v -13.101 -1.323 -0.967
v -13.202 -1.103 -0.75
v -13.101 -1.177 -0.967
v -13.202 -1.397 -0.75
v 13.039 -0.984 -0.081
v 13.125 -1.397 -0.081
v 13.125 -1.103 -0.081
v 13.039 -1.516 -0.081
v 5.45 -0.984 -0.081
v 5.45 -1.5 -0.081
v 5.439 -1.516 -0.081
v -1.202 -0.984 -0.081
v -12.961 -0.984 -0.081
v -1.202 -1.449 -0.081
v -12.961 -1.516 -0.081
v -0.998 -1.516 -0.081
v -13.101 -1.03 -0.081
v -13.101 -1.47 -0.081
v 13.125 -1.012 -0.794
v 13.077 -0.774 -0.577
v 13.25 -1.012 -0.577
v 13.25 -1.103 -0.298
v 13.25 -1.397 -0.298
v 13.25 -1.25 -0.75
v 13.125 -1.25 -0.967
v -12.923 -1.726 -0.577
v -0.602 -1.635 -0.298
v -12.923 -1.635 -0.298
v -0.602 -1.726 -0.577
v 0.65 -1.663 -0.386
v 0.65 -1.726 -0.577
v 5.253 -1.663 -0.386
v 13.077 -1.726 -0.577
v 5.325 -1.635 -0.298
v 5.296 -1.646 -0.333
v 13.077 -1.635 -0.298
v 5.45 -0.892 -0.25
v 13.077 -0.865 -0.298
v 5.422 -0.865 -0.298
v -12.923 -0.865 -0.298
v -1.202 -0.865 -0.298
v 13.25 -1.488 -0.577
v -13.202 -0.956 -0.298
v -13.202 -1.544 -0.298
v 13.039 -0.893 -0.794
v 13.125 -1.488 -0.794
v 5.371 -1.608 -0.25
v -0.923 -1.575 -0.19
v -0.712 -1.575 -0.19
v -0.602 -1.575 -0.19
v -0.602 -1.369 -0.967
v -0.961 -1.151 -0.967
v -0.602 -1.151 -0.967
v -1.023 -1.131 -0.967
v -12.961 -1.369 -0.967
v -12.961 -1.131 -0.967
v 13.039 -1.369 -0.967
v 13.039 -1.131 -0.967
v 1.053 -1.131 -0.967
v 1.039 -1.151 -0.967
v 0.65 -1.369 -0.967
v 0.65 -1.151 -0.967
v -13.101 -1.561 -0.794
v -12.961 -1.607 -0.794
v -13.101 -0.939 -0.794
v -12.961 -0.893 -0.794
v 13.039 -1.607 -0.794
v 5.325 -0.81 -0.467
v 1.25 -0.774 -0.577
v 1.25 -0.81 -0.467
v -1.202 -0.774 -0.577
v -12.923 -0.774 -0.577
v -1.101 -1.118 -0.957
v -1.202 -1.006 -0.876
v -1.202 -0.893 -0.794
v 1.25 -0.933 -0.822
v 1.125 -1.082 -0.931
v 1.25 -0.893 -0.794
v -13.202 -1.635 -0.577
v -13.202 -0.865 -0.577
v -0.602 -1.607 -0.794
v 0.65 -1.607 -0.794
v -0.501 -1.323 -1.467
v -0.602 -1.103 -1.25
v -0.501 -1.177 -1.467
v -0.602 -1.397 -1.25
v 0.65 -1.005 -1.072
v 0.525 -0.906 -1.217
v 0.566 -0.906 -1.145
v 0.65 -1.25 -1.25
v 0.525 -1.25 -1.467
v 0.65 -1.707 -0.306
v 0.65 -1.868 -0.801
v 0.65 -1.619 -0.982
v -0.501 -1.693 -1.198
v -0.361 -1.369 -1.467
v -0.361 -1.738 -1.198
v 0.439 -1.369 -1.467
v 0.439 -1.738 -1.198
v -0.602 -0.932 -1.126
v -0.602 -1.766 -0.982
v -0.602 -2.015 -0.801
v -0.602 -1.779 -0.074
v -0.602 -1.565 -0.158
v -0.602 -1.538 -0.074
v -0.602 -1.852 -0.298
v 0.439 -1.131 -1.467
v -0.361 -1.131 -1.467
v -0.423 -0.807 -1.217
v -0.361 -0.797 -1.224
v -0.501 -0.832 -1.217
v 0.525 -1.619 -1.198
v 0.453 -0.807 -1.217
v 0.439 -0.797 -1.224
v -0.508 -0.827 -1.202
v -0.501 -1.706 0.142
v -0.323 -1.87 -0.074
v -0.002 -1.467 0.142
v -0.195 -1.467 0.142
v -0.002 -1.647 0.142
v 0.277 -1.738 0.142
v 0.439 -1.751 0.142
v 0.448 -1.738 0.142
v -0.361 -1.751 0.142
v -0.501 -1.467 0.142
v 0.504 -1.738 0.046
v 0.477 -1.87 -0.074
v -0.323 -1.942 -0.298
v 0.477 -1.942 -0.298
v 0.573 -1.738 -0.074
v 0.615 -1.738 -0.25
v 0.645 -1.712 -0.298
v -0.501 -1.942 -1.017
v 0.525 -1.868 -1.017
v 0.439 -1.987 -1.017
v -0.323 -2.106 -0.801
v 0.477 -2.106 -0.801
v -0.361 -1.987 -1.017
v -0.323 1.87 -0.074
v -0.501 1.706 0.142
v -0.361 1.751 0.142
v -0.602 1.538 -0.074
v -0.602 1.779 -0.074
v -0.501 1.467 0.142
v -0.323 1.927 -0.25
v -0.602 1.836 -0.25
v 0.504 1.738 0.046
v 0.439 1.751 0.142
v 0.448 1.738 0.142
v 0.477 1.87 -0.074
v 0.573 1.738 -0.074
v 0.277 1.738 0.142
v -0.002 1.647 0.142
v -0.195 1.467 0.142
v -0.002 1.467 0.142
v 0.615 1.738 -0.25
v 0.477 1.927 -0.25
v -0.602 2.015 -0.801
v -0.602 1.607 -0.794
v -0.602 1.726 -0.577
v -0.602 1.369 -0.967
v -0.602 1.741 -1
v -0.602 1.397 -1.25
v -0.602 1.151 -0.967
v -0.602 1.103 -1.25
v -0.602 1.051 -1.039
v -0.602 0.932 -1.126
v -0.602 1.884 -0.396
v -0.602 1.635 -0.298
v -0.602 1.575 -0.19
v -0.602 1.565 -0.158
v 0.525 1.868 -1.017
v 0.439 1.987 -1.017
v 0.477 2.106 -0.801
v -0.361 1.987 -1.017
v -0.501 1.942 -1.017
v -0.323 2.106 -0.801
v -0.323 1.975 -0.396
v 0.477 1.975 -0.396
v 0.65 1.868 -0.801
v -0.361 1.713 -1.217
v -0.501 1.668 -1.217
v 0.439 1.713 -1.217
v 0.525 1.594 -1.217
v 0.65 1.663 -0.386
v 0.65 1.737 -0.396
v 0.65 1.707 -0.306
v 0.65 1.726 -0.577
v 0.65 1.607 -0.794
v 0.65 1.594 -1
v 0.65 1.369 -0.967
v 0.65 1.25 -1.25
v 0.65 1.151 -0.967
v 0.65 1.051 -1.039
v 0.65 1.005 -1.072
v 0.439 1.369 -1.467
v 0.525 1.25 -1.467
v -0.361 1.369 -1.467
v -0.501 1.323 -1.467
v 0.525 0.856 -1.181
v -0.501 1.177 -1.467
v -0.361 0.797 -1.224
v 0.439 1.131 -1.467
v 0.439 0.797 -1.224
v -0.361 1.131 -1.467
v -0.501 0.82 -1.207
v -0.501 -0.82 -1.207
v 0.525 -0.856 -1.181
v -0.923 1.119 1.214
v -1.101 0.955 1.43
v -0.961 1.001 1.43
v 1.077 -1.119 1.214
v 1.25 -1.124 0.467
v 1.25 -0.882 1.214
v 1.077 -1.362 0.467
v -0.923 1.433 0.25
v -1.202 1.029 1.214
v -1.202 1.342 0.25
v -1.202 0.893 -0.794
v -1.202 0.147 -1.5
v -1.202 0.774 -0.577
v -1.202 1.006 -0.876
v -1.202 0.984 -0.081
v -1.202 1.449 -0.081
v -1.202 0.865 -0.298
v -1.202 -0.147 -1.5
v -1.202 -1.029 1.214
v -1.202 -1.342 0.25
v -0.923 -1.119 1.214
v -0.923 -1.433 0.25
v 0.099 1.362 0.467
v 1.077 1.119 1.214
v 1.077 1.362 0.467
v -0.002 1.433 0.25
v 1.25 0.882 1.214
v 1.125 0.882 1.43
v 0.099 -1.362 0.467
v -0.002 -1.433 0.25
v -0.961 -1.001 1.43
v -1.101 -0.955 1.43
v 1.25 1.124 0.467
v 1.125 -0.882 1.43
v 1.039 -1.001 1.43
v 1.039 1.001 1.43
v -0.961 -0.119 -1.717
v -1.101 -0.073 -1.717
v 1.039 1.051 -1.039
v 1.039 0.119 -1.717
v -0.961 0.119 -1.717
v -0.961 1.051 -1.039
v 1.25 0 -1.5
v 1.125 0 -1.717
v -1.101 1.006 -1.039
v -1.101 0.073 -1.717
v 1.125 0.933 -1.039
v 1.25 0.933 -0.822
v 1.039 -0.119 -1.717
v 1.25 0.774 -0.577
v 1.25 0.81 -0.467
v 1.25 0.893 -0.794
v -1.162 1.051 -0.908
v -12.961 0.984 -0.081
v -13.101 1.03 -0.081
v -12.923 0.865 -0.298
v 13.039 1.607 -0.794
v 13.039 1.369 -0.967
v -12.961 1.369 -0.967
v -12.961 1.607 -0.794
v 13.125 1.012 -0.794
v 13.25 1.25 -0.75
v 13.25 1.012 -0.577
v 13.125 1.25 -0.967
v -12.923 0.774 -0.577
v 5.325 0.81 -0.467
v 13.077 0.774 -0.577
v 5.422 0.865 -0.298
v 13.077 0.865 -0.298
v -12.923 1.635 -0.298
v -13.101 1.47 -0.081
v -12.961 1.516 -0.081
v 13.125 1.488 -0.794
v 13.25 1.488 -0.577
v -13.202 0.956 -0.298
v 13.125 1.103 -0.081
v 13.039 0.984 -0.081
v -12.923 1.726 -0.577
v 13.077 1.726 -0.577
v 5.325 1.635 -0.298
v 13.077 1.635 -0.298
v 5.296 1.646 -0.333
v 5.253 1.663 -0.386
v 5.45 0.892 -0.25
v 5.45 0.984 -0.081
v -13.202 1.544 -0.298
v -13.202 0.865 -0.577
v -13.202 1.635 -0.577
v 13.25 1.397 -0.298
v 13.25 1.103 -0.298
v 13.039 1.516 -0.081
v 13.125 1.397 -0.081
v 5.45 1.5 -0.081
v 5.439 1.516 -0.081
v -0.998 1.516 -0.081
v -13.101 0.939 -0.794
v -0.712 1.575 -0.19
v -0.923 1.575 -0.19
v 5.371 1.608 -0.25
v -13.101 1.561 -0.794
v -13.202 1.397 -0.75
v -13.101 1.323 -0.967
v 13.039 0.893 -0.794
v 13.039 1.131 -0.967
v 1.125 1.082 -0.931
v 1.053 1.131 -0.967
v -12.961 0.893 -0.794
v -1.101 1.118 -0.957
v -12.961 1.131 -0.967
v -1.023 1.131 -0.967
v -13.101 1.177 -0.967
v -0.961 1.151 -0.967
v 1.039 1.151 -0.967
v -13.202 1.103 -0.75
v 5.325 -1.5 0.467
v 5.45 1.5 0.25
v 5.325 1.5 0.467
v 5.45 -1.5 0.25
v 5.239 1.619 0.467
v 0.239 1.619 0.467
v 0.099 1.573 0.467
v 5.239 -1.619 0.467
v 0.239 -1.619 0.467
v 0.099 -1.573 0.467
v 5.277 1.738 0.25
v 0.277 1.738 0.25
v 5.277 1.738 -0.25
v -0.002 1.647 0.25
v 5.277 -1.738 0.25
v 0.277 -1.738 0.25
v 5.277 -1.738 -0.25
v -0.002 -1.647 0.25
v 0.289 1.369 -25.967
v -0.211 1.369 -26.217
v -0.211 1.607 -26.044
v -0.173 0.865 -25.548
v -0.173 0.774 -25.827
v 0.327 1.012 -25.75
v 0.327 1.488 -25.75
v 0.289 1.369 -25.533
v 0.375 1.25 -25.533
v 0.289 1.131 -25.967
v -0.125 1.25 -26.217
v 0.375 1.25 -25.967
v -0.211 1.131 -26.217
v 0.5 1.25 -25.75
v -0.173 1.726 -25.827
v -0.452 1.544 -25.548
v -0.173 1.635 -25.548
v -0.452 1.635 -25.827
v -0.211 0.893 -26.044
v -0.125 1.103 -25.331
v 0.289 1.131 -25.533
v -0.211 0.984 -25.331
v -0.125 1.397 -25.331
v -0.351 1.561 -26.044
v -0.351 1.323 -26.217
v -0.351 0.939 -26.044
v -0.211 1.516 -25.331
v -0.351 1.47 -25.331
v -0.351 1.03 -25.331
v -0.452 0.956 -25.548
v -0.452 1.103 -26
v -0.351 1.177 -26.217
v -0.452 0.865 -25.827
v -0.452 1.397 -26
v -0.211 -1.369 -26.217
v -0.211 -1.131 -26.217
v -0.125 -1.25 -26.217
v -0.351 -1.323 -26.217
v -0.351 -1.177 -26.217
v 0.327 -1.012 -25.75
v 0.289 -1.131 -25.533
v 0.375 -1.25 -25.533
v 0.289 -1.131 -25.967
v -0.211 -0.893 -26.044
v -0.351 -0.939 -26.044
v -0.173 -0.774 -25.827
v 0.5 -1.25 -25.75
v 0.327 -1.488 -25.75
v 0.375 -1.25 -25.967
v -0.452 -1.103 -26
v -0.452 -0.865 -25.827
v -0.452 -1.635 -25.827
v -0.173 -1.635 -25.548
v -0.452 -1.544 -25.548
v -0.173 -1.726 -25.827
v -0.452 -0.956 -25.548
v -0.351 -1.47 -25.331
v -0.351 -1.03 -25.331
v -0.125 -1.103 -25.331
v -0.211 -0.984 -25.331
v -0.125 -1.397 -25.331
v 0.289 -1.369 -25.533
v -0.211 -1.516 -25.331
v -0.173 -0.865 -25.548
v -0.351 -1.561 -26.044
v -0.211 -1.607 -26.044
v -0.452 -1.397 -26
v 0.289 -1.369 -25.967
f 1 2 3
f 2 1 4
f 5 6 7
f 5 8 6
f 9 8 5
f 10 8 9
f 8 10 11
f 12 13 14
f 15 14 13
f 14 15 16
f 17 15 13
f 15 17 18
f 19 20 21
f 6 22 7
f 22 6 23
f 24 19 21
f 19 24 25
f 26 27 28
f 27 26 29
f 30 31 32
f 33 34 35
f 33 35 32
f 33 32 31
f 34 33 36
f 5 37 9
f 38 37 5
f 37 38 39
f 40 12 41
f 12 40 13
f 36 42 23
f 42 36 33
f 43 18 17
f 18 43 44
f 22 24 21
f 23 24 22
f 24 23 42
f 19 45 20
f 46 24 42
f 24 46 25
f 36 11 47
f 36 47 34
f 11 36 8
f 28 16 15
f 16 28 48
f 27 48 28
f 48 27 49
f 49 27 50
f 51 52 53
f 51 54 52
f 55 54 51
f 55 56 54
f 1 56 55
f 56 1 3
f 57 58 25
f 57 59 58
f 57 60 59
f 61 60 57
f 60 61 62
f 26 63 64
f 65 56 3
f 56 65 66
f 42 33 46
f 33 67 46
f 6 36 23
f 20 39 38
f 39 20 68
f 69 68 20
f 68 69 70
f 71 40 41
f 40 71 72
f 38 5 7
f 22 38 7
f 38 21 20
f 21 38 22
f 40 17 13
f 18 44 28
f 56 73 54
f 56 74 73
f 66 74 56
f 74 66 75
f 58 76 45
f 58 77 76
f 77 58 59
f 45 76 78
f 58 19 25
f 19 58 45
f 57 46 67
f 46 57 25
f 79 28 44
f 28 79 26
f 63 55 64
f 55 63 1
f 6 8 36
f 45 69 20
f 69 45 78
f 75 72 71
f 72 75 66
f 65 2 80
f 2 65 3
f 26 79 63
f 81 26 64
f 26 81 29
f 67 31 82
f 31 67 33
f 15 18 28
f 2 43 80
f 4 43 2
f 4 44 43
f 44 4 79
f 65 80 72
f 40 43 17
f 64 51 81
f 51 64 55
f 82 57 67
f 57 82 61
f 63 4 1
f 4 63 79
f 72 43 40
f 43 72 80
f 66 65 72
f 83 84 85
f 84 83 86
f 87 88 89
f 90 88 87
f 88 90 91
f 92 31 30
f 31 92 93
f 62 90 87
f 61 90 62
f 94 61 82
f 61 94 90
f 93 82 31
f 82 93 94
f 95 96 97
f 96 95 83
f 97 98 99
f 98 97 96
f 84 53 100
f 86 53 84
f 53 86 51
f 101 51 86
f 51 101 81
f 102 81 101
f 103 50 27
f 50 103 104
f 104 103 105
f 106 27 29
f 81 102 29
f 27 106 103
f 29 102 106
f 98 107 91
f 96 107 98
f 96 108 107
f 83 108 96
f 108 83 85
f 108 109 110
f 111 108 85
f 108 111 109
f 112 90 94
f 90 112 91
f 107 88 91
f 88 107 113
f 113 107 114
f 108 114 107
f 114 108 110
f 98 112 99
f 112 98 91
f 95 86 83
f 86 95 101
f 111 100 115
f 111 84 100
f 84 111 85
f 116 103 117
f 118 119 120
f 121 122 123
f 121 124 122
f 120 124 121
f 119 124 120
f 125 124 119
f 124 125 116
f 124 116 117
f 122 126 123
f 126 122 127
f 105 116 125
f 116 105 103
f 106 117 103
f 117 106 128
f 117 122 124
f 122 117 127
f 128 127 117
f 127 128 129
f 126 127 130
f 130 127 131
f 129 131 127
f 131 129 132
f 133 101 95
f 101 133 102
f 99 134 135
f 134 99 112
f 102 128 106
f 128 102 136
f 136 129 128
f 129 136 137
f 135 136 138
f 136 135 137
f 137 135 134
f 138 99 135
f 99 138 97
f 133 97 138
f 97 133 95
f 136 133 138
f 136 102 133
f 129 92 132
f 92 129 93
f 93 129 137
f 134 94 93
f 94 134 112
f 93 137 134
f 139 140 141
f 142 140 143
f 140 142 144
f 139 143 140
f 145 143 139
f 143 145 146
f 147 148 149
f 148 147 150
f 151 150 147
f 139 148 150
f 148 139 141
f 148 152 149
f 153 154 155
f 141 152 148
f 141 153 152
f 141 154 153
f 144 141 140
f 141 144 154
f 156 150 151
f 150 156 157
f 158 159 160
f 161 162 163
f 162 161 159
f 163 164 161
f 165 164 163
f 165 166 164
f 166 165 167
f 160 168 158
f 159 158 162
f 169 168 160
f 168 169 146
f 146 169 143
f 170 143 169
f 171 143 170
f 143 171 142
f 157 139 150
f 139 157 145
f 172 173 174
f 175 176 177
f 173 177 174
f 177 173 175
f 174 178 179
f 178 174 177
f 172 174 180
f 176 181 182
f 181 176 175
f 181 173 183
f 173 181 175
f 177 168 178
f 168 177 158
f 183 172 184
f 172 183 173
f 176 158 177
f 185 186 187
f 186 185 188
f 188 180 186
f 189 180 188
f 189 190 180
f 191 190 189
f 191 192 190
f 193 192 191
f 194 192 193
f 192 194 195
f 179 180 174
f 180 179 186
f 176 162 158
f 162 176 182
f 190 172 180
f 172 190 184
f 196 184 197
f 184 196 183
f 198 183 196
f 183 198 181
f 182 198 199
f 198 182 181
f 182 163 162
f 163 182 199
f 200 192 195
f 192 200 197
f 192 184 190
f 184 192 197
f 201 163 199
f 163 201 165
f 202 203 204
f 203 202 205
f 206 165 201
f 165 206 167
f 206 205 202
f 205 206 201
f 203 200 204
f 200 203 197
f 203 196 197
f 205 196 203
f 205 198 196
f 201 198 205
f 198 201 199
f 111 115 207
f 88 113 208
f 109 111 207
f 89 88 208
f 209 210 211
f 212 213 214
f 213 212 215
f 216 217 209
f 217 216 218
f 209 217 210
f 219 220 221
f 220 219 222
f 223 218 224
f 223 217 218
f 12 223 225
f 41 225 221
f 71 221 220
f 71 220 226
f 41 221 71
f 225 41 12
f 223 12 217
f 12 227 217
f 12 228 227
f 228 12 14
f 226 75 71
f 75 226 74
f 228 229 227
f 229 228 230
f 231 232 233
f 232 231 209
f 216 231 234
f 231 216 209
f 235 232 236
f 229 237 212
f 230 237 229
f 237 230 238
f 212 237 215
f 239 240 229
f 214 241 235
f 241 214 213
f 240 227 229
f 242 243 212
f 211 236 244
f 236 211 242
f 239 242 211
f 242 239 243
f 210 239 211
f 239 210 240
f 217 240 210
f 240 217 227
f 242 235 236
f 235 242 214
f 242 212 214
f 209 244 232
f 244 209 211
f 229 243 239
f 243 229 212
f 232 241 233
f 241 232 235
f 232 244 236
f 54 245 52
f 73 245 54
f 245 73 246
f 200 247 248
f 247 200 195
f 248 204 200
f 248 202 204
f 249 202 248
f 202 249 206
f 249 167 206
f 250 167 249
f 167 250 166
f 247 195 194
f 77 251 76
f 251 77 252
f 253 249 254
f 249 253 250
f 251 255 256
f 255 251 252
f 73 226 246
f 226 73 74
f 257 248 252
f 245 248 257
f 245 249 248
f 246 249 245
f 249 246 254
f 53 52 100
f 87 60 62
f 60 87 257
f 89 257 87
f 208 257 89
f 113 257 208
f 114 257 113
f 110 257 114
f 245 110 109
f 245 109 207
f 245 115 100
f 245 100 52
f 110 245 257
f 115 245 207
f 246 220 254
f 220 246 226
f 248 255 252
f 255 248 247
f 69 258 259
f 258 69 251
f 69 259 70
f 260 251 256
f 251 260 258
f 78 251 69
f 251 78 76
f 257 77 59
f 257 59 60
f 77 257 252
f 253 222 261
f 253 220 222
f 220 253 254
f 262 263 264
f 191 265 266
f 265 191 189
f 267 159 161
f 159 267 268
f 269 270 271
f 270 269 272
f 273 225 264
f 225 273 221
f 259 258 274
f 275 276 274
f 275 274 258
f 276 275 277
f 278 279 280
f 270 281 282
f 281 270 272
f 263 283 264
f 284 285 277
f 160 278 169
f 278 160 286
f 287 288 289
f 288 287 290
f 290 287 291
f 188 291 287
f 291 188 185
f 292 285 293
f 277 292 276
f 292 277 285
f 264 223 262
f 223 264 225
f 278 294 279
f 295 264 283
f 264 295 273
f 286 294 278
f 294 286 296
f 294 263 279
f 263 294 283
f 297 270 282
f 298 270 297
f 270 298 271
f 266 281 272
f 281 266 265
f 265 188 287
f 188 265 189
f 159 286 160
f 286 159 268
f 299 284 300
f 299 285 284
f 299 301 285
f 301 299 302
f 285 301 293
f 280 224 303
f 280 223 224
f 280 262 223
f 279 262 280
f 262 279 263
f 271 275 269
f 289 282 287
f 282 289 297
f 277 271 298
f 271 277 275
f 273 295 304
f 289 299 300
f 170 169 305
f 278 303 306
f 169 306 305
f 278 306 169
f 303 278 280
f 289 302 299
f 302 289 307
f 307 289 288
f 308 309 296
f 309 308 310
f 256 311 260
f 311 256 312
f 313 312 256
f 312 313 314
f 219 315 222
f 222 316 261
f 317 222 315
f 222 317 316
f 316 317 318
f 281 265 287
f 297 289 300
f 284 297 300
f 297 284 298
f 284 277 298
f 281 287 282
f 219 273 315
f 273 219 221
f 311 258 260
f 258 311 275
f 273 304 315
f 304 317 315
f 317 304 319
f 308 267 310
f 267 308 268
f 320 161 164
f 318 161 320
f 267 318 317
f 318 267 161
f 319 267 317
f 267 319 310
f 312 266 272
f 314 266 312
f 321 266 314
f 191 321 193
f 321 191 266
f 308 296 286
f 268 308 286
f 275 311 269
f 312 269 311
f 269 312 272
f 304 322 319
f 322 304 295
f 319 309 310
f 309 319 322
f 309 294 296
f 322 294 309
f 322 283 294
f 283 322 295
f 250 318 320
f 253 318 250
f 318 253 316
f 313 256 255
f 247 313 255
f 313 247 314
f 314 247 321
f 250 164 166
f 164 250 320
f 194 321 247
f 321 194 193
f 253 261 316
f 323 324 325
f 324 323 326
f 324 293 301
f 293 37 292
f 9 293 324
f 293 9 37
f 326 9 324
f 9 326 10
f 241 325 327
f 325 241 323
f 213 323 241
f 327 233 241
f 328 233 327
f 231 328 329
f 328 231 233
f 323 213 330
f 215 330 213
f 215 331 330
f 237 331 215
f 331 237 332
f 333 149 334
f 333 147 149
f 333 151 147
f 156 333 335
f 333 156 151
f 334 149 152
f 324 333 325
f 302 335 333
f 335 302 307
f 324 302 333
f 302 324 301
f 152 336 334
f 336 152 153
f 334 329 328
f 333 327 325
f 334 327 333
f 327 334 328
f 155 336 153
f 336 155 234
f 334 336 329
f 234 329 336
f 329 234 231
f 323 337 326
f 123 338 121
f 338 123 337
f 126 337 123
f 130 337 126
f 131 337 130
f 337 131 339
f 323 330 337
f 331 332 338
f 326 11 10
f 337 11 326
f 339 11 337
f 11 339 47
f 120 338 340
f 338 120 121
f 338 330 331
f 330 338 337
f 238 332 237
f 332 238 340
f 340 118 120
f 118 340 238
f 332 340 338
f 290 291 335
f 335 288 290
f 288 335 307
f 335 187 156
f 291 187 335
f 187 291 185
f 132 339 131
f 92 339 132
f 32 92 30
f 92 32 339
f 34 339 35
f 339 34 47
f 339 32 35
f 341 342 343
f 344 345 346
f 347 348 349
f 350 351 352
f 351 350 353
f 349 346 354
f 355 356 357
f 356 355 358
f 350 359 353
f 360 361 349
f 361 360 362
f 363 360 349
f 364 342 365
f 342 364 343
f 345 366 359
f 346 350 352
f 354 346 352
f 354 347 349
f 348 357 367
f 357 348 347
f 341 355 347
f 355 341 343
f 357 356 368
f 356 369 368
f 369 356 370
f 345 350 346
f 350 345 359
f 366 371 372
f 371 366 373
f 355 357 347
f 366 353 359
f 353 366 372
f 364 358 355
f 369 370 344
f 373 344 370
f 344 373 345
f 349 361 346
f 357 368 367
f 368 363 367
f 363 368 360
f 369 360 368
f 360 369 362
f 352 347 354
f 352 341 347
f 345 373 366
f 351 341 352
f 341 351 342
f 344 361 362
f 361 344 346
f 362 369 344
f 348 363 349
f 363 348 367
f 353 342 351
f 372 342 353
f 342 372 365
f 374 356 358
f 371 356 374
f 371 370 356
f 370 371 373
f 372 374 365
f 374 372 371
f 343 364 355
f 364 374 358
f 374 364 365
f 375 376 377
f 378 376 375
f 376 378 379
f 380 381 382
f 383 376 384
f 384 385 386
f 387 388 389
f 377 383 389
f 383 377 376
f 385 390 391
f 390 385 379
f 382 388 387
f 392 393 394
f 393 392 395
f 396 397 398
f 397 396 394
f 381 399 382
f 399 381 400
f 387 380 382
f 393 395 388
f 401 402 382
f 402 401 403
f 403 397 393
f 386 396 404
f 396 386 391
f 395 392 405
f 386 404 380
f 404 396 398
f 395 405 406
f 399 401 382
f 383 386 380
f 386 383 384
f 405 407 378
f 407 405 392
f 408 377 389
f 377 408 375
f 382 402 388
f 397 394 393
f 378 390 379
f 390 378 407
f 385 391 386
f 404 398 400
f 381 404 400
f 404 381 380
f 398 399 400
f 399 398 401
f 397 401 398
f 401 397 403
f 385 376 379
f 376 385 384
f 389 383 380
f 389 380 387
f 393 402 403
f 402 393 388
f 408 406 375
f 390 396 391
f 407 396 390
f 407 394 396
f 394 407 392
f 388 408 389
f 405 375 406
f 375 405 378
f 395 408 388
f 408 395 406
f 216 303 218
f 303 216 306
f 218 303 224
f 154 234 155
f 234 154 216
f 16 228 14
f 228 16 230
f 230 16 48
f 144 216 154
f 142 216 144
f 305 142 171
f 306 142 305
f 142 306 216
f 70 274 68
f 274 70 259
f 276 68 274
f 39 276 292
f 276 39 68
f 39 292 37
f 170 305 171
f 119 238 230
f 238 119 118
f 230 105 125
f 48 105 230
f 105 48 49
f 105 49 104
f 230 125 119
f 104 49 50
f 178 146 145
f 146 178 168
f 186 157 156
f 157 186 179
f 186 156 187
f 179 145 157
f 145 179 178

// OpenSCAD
// Parameters
body_d = 3.0; //[1.5:6.0:0.1]
body_t = 2.0; //[1.0:4.0:0.1]
lead_d = 0.5; //[0.25:1.0:0.05]
lead_len = 25.0; //[12.0:50.0:1]
lead_pitch = 2.5; //[1.25:5.0:0.1]
lead_embed = 1.0; //[0.5:2.0:0.1]
lead_bend_len = 5.0; //[2.0:10.0:0.5]
transition_len = 0.8; //[0.4:1.6:0.05]
overlap = 0.8; //[0.5:2.0:0.1]
mark_dot_r = 0.35; //[0.2:0.8:0.05]
mark_dot_h = 0.2; //[0.1:0.6:0.05]
label_w = 1.6; //[0.8:3.2:0.1]
label_h = 0.9; //[0.45:1.8:0.1]
label_t = 0.15; //[0.08:0.4:0.01]
fillet_r = 0.25; //[0.1:0.6:0.05]

// Thermistor Body
module thermistor_body() {
  color([0.85, 0.85, 0.8]) // Off-white for epoxy
  rotate([0, 90, 0])
  translate([0, 0, 0])
  cylinder(r=body_d/2, h=body_t, center=true);
}

// Lead
module lead(position_y) {
  color([0.2, 0.2, 0.2]) // Dark color for leads
  rotate([0, 90, 0])
  translate([body_t/2 - lead_embed/2, position_y, 0])
  cylinder(r=lead_d/2, h=lead_len + lead_embed, center=true);
}

// Lead Spacing Reference
module lead_spacing_reference() {
  translate([body_t/2 - lead_embed + overlap/2, 0, 0])
  cube([lead_d, lead_pitch, lead_d], center=true);
}

// Lead Bend Region
module lead_bend_region() {
  translate([body_t/2 + lead_bend_len/2 - overlap, 0, 0])
  cube([lead_bend_len, lead_pitch + lead_d, lead_d], center=true);
}

// Body to Lead Transition
module body_to_lead_transition(position_y) {
  rotate([0, 90, 0])
  translate([body_t/2 - transition_len/2, position_y, 0])
  cylinder(r=lead_d/2 + transition_len/2, h=transition_len, center=true);
}

// Polarity Marking Dot
module polarity_marking_dot() {
  color("Black")
  translate([0, 0, body_d/2 + mark_dot_h/2 - overlap])
  cylinder(r=mark_dot_r, h=mark_dot_h, center=true);
}

// Printed Label
module printed_label() {
  color("Black")
  translate([0, 0, body_d/2 + label_t/2 - overlap])
  cube([label_w, label_h, label_t], center=true);
}

// Lead Tip Chamfer
module lead_tip_chamfer(position_y) {
  rotate([0, 90, 0])
  translate([body_t/2 + lead_len - lead_d/2, position_y, 0])
  cylinder(r1=lead_d/2, r2=0, h=lead_d, center=true);
}

// Small Fillets Kernel
module small_fillets_kernel() {
  sphere(r=fillet_r);
}

// Union of Raw Model
module union_raw_model() {
  union() {
    thermistor_body();
    lead(lead_pitch/2);
    lead(-lead_pitch/2);
    lead_spacing_reference();
    lead_bend_region();
    body_to_lead_transition(lead_pitch/2);
    body_to_lead_transition(-lead_pitch/2);
    polarity_marking_dot();
    printed_label();
    lead_tip_chamfer(lead_pitch/2);
    lead_tip_chamfer(-lead_pitch/2);
  }
}

// Final Output with Small Fillets
minkowski() {
  union_raw_model();
  small_fillets_kernel();
}
